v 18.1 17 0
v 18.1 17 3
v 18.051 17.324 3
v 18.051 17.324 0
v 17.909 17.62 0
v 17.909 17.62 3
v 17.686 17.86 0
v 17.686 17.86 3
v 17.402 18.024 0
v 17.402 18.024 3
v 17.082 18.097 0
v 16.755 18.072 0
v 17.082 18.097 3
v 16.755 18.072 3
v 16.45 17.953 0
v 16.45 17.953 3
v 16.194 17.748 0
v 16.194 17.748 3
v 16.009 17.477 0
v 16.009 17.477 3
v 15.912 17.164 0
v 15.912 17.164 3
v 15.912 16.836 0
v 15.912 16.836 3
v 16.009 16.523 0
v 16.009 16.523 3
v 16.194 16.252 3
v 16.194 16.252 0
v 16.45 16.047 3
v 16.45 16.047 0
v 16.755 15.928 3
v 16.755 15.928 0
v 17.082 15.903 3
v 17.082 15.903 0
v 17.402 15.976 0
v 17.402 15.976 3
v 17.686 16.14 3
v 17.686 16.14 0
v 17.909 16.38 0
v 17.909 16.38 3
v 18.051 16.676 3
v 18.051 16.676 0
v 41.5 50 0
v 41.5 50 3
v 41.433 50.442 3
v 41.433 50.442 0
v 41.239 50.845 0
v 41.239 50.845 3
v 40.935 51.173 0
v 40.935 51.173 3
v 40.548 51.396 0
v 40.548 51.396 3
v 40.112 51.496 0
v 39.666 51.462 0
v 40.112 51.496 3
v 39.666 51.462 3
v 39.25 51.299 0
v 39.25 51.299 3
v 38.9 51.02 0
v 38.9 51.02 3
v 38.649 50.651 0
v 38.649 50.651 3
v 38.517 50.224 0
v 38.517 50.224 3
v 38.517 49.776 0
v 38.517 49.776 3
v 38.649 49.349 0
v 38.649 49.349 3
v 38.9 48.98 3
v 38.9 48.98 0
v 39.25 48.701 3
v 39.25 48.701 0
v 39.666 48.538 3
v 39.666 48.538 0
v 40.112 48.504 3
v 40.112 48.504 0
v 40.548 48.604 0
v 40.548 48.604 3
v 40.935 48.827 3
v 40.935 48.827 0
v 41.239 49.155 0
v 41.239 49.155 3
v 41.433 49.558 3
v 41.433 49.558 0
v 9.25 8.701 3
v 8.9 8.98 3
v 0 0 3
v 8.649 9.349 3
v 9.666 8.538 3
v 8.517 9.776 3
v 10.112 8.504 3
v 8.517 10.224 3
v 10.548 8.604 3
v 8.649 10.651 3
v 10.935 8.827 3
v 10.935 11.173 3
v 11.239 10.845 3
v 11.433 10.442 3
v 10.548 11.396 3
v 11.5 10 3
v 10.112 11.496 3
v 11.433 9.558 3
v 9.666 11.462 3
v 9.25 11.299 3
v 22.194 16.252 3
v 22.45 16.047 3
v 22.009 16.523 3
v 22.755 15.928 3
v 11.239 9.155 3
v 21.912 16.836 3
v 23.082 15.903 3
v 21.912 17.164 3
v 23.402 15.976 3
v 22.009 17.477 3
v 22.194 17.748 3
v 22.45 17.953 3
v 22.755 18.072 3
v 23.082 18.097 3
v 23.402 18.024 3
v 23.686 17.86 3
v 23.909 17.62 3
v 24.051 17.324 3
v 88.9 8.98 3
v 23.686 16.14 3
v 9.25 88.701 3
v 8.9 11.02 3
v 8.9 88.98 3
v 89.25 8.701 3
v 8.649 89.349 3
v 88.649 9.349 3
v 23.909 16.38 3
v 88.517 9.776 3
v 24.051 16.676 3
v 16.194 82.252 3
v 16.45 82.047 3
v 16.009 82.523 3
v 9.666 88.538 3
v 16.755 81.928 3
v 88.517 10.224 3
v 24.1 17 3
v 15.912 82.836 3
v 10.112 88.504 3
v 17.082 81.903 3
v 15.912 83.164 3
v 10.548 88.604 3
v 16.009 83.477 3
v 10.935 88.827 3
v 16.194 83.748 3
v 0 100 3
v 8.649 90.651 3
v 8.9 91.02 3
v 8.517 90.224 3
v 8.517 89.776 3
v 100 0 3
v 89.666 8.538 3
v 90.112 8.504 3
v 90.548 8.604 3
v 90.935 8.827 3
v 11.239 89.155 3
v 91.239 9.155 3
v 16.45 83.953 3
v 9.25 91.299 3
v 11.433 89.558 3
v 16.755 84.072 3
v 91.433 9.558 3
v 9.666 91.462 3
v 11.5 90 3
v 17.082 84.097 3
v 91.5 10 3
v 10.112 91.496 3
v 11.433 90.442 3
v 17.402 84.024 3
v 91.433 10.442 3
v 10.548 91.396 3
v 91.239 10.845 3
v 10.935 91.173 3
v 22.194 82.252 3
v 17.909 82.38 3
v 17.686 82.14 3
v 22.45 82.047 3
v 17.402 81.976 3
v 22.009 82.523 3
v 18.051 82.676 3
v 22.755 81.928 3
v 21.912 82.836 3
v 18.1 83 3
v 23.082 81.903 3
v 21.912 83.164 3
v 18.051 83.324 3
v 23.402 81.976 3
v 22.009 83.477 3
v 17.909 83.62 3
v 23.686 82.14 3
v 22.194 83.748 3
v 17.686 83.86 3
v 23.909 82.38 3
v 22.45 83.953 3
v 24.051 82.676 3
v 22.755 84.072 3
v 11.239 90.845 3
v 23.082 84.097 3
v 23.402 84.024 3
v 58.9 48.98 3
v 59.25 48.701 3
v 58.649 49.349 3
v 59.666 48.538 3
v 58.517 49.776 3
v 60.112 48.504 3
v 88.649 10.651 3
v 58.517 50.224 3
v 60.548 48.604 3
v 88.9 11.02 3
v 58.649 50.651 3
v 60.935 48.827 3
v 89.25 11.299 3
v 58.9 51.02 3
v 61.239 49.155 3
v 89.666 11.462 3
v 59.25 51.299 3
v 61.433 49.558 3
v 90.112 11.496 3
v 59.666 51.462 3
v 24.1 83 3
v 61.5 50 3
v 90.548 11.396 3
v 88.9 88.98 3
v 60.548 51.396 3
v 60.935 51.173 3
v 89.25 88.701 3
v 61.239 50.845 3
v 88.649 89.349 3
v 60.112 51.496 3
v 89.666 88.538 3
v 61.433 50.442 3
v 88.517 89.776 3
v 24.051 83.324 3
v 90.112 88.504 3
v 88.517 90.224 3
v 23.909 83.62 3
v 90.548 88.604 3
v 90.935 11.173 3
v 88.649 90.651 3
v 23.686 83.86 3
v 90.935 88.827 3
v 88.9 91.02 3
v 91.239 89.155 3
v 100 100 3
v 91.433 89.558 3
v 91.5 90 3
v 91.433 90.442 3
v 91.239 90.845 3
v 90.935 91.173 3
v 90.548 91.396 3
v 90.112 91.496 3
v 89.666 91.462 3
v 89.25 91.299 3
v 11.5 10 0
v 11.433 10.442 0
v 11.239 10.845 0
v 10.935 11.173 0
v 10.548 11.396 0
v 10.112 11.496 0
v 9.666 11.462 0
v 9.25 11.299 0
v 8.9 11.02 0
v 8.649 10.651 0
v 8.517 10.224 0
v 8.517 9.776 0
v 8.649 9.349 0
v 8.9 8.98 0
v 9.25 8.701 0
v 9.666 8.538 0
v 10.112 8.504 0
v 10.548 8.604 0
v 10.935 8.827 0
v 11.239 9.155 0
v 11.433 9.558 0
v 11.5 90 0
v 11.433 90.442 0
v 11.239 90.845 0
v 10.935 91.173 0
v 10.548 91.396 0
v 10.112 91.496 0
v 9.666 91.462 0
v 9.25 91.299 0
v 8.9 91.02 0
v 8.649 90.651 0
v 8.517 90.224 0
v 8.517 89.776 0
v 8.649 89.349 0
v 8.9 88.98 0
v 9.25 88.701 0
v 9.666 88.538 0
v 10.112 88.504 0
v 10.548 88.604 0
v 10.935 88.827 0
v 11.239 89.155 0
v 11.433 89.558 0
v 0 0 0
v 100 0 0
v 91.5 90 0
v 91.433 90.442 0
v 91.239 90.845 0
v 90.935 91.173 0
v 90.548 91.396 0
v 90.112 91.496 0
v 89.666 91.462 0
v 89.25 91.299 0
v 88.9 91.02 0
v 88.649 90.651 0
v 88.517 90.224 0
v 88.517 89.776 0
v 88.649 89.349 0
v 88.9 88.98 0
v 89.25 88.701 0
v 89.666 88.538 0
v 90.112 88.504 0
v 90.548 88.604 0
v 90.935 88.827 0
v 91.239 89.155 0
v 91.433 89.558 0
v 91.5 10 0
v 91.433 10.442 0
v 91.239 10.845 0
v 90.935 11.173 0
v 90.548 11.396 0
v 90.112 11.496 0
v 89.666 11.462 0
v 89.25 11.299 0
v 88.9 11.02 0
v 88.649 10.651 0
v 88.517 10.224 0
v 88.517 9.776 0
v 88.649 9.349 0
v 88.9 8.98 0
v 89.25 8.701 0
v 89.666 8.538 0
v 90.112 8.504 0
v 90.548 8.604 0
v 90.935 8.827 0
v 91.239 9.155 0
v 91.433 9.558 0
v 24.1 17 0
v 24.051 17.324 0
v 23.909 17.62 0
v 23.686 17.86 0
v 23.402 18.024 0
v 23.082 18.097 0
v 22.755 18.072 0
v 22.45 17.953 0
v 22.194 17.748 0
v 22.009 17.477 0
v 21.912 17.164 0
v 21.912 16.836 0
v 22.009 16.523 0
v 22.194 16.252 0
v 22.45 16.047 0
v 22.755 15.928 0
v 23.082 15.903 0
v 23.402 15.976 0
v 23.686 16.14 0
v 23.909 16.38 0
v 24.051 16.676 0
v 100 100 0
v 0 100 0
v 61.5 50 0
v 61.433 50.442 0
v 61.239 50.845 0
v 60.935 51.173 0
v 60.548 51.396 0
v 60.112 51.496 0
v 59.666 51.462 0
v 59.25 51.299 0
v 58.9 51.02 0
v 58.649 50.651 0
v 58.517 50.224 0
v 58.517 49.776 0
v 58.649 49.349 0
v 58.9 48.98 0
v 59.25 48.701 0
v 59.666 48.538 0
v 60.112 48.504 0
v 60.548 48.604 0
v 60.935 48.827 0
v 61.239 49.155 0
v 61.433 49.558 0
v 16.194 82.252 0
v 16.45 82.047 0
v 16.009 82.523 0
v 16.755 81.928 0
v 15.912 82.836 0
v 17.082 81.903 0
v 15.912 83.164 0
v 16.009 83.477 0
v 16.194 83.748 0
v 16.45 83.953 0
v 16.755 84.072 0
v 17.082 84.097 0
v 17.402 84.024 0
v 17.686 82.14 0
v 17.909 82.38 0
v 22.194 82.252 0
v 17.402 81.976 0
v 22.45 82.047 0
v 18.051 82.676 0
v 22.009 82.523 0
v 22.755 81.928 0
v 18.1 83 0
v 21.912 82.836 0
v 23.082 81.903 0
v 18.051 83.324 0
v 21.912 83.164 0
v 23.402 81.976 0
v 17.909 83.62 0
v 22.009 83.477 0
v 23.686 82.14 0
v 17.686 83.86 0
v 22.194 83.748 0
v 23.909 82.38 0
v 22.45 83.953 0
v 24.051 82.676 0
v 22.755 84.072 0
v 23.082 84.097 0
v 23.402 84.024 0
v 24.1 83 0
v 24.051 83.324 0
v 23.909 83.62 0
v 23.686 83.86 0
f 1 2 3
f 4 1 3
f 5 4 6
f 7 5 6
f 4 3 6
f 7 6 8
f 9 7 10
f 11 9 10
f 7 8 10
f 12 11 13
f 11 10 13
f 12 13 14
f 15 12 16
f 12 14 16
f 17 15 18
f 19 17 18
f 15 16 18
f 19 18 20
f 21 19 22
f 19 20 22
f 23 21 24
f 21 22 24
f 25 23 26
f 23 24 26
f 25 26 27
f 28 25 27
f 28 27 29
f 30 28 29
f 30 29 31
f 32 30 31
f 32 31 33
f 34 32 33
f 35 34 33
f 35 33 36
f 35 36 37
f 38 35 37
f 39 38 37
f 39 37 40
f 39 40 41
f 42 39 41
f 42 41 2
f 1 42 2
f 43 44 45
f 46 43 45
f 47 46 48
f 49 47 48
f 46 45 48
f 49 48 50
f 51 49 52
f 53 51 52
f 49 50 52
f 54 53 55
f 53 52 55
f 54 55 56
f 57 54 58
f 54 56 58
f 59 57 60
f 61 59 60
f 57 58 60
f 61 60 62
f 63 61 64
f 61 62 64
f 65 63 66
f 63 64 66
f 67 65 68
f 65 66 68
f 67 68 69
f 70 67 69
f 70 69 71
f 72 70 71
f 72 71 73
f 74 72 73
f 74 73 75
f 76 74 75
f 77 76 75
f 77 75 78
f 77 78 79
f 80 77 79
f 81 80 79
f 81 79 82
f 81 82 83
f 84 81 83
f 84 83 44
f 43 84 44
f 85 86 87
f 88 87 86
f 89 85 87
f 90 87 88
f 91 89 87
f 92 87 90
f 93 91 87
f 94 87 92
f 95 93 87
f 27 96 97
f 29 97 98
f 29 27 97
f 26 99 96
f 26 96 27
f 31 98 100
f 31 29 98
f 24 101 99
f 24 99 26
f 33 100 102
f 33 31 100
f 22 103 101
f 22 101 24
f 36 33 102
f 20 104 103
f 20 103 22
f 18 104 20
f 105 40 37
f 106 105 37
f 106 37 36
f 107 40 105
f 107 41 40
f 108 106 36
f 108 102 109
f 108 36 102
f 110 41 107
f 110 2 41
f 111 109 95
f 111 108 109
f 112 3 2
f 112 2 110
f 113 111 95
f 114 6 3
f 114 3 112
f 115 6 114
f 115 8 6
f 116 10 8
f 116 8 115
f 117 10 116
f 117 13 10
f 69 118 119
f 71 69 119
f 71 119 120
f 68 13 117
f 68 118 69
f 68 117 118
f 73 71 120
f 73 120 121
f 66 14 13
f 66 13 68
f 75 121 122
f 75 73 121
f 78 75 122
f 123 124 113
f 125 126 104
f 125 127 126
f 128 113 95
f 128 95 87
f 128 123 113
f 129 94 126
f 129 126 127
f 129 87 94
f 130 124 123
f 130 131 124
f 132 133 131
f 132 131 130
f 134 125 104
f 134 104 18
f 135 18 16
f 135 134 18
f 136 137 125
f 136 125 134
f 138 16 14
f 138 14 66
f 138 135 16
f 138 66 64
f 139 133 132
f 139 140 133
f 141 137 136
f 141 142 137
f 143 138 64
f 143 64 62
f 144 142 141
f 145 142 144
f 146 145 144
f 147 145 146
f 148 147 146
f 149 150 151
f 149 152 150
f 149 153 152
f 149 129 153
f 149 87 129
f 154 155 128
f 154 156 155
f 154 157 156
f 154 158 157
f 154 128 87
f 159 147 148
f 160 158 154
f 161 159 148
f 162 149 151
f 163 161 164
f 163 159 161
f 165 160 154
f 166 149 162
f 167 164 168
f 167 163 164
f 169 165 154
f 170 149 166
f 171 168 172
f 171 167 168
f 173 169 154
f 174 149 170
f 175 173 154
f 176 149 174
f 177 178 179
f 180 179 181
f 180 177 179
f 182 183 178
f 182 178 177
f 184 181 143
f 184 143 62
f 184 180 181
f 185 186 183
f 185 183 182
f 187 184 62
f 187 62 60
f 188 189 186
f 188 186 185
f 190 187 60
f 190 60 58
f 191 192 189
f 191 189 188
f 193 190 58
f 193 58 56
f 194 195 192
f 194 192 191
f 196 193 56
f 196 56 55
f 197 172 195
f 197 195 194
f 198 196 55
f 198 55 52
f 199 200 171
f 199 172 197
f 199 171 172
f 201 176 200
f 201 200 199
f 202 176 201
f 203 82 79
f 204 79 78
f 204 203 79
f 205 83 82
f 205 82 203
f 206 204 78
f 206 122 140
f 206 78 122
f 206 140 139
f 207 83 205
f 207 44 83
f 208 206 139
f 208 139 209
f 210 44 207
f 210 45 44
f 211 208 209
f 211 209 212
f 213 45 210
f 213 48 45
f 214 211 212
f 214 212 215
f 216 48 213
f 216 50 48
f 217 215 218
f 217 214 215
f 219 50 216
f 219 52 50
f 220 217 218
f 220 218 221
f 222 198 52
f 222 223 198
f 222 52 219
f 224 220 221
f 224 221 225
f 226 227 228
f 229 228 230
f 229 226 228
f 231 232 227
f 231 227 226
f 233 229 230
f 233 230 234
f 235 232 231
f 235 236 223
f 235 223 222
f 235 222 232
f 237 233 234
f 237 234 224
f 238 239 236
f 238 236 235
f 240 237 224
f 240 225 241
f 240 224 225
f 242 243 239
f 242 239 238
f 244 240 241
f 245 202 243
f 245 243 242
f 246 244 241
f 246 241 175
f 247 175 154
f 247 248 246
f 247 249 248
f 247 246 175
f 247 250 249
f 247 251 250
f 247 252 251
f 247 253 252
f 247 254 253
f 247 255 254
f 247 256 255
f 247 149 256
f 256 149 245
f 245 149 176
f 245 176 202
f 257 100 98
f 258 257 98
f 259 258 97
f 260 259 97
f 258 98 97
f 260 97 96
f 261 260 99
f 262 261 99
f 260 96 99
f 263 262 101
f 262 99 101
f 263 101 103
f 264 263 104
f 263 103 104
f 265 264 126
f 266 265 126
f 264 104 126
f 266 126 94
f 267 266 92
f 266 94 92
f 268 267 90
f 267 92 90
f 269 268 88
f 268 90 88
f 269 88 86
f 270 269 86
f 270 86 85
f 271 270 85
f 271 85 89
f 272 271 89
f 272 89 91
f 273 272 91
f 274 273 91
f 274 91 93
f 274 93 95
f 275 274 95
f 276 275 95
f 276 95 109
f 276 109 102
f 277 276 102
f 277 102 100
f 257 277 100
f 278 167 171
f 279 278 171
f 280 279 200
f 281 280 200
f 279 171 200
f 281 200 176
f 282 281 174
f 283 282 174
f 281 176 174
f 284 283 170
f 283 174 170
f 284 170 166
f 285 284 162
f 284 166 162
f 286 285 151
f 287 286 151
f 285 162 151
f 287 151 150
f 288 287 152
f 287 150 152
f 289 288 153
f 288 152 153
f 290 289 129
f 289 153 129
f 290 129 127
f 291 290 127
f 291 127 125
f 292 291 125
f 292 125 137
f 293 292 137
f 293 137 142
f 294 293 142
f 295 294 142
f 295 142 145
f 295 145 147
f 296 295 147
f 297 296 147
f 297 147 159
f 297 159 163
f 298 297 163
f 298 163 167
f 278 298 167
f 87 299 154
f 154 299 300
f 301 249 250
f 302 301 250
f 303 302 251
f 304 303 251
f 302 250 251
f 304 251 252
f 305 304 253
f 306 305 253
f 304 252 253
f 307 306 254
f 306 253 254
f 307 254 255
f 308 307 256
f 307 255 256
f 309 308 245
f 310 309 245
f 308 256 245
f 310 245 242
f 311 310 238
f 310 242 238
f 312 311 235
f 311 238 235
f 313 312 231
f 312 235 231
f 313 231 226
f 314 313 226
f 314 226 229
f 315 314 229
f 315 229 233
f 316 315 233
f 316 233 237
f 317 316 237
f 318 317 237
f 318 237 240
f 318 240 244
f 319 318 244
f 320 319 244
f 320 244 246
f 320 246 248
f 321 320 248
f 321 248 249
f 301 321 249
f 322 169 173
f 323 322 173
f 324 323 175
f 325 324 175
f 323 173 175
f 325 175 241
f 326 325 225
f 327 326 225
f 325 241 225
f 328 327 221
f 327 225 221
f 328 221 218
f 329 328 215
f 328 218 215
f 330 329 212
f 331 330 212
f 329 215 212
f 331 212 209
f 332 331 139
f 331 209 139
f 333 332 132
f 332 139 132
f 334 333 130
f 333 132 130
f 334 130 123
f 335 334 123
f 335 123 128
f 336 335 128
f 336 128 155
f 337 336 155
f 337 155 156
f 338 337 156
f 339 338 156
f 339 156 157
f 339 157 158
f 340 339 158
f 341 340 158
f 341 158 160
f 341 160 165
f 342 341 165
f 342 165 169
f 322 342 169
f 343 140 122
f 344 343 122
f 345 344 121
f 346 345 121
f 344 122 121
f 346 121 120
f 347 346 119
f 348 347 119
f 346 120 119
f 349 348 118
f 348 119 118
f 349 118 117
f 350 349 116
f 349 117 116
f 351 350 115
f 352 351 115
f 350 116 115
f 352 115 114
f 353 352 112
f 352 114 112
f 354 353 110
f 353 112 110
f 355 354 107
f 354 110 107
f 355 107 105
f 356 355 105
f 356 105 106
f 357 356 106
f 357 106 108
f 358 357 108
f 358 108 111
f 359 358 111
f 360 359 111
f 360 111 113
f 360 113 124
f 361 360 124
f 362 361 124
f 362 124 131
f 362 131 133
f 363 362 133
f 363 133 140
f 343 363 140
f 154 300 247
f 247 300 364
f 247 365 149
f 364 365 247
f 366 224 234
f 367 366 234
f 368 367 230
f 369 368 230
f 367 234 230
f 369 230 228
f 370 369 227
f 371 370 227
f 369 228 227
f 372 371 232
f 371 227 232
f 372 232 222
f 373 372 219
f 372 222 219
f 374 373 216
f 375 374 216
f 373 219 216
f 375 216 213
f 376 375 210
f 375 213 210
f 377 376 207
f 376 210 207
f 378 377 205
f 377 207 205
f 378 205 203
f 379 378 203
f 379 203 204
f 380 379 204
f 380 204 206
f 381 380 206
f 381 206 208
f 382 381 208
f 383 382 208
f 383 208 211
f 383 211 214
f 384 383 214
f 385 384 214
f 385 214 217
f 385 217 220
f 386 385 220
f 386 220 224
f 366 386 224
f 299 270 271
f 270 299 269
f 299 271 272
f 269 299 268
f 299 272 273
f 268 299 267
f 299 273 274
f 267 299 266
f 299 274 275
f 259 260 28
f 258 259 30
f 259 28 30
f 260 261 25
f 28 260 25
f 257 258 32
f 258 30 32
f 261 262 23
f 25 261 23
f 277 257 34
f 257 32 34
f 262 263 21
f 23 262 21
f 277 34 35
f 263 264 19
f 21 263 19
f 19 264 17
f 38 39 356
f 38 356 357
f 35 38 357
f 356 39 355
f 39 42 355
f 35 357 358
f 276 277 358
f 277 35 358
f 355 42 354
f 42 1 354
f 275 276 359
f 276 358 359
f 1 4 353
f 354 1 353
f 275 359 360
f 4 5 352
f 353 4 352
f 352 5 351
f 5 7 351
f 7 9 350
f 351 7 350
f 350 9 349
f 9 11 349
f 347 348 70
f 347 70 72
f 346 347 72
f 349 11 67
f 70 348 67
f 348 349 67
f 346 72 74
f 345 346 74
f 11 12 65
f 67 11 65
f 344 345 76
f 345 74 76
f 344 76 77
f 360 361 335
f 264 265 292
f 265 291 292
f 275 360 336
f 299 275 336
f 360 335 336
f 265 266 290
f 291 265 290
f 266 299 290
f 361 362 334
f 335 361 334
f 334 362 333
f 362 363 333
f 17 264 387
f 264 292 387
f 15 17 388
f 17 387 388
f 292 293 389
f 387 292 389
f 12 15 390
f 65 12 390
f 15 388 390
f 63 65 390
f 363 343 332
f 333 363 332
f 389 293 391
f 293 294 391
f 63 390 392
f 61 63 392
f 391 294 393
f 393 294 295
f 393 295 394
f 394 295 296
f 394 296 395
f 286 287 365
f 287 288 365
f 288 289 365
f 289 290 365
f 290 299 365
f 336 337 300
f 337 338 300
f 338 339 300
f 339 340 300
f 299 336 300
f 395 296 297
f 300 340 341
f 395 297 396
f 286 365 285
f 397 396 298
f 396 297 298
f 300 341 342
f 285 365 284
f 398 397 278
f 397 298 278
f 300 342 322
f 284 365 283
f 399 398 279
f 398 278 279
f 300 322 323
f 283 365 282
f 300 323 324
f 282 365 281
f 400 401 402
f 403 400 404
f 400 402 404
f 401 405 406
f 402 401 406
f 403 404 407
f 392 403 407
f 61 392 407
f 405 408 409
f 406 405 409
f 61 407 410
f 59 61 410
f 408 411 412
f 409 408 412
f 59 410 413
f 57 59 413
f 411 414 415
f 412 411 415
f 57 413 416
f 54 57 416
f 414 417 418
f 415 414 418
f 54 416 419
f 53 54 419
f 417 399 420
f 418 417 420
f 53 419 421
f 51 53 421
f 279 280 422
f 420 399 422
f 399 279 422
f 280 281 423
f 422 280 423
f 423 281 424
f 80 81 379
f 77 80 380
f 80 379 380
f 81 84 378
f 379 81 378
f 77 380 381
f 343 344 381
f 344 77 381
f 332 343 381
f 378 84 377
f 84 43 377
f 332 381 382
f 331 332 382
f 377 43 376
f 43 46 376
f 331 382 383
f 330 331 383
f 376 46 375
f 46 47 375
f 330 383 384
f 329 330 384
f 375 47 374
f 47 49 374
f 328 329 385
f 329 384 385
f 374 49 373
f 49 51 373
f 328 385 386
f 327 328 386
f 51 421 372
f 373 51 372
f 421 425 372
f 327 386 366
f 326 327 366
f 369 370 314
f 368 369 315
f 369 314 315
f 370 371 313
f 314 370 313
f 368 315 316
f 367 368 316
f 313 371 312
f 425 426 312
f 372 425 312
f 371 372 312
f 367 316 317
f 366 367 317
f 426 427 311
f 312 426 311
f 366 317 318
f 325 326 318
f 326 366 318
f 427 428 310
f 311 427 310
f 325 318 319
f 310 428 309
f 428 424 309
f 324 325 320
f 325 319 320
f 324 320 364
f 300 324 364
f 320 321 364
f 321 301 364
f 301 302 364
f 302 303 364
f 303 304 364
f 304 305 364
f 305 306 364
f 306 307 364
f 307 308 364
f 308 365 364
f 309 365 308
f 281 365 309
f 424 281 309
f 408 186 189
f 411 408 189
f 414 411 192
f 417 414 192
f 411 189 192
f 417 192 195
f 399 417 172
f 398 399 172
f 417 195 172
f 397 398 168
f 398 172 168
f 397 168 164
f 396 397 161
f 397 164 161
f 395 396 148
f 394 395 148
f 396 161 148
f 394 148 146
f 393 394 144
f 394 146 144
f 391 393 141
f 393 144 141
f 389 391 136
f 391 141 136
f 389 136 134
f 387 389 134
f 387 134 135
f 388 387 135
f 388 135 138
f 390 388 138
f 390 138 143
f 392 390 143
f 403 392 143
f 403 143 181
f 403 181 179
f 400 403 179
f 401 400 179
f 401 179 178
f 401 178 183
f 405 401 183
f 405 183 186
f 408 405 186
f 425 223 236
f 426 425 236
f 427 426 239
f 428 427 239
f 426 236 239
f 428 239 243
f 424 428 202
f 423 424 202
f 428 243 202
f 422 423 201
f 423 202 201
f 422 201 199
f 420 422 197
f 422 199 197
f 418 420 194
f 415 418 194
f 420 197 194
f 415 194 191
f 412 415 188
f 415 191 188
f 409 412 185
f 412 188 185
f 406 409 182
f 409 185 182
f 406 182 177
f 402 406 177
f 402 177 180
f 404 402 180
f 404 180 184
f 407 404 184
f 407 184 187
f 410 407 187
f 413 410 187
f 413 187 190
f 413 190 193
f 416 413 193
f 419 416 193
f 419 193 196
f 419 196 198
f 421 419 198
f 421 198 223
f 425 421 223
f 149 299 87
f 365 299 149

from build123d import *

# Parameters (mm, degrees)
F0_W     = 100
F0_H     = 100
F1_DEPTH = 3
F2_R     = 1.5
F3_DEPTH = 3.001
F4_R     = 1.1
F5_DEPTH = 3.001
F6_R     = 1.5
F7_DEPTH = 3.001


with BuildPart() as f1:
    # F0 (on Top) → F1 (new body)
    with BuildSketch(Plane.XY):
        with Locations((50, 50)):
            Rectangle(F0_W, F0_H)
    extrude(amount=F1_DEPTH)

    # F2 (on face) → F3 (cut, through all)
    with BuildSketch(Plane.XY.offset(3)):
        with Locations((10, 90)):
            Circle(F2_R)
        with Locations((90, 90)):
            Circle(F2_R)
        with Locations((90, 10)):
            Circle(F2_R)
        with Locations((10, 10)):
            Circle(F2_R)
    extrude(amount=-F3_DEPTH, mode=Mode.SUBTRACT)

    # F4 (on face) → F5 (cut, through all)
    with BuildSketch(Plane.XY.offset(3)):
        with Locations((17, 83)):
            Circle(F4_R)
        with Locations((23, 83)):
            Circle(F4_R)
        with Locations((17, 17)):
            Circle(F4_R)
        with Locations((23, 17)):
            Circle(F4_R)
    extrude(amount=-F5_DEPTH, mode=Mode.SUBTRACT)

    # F6 (on face) → F7 (cut, through all)
    with BuildSketch(Plane.XY.offset(3)):
        with Locations((40, 50)):
            Circle(F6_R)
        with Locations((60, 50)):
            Circle(F6_R)
    extrude(amount=-F7_DEPTH, mode=Mode.SUBTRACT)


solid = f1.part
